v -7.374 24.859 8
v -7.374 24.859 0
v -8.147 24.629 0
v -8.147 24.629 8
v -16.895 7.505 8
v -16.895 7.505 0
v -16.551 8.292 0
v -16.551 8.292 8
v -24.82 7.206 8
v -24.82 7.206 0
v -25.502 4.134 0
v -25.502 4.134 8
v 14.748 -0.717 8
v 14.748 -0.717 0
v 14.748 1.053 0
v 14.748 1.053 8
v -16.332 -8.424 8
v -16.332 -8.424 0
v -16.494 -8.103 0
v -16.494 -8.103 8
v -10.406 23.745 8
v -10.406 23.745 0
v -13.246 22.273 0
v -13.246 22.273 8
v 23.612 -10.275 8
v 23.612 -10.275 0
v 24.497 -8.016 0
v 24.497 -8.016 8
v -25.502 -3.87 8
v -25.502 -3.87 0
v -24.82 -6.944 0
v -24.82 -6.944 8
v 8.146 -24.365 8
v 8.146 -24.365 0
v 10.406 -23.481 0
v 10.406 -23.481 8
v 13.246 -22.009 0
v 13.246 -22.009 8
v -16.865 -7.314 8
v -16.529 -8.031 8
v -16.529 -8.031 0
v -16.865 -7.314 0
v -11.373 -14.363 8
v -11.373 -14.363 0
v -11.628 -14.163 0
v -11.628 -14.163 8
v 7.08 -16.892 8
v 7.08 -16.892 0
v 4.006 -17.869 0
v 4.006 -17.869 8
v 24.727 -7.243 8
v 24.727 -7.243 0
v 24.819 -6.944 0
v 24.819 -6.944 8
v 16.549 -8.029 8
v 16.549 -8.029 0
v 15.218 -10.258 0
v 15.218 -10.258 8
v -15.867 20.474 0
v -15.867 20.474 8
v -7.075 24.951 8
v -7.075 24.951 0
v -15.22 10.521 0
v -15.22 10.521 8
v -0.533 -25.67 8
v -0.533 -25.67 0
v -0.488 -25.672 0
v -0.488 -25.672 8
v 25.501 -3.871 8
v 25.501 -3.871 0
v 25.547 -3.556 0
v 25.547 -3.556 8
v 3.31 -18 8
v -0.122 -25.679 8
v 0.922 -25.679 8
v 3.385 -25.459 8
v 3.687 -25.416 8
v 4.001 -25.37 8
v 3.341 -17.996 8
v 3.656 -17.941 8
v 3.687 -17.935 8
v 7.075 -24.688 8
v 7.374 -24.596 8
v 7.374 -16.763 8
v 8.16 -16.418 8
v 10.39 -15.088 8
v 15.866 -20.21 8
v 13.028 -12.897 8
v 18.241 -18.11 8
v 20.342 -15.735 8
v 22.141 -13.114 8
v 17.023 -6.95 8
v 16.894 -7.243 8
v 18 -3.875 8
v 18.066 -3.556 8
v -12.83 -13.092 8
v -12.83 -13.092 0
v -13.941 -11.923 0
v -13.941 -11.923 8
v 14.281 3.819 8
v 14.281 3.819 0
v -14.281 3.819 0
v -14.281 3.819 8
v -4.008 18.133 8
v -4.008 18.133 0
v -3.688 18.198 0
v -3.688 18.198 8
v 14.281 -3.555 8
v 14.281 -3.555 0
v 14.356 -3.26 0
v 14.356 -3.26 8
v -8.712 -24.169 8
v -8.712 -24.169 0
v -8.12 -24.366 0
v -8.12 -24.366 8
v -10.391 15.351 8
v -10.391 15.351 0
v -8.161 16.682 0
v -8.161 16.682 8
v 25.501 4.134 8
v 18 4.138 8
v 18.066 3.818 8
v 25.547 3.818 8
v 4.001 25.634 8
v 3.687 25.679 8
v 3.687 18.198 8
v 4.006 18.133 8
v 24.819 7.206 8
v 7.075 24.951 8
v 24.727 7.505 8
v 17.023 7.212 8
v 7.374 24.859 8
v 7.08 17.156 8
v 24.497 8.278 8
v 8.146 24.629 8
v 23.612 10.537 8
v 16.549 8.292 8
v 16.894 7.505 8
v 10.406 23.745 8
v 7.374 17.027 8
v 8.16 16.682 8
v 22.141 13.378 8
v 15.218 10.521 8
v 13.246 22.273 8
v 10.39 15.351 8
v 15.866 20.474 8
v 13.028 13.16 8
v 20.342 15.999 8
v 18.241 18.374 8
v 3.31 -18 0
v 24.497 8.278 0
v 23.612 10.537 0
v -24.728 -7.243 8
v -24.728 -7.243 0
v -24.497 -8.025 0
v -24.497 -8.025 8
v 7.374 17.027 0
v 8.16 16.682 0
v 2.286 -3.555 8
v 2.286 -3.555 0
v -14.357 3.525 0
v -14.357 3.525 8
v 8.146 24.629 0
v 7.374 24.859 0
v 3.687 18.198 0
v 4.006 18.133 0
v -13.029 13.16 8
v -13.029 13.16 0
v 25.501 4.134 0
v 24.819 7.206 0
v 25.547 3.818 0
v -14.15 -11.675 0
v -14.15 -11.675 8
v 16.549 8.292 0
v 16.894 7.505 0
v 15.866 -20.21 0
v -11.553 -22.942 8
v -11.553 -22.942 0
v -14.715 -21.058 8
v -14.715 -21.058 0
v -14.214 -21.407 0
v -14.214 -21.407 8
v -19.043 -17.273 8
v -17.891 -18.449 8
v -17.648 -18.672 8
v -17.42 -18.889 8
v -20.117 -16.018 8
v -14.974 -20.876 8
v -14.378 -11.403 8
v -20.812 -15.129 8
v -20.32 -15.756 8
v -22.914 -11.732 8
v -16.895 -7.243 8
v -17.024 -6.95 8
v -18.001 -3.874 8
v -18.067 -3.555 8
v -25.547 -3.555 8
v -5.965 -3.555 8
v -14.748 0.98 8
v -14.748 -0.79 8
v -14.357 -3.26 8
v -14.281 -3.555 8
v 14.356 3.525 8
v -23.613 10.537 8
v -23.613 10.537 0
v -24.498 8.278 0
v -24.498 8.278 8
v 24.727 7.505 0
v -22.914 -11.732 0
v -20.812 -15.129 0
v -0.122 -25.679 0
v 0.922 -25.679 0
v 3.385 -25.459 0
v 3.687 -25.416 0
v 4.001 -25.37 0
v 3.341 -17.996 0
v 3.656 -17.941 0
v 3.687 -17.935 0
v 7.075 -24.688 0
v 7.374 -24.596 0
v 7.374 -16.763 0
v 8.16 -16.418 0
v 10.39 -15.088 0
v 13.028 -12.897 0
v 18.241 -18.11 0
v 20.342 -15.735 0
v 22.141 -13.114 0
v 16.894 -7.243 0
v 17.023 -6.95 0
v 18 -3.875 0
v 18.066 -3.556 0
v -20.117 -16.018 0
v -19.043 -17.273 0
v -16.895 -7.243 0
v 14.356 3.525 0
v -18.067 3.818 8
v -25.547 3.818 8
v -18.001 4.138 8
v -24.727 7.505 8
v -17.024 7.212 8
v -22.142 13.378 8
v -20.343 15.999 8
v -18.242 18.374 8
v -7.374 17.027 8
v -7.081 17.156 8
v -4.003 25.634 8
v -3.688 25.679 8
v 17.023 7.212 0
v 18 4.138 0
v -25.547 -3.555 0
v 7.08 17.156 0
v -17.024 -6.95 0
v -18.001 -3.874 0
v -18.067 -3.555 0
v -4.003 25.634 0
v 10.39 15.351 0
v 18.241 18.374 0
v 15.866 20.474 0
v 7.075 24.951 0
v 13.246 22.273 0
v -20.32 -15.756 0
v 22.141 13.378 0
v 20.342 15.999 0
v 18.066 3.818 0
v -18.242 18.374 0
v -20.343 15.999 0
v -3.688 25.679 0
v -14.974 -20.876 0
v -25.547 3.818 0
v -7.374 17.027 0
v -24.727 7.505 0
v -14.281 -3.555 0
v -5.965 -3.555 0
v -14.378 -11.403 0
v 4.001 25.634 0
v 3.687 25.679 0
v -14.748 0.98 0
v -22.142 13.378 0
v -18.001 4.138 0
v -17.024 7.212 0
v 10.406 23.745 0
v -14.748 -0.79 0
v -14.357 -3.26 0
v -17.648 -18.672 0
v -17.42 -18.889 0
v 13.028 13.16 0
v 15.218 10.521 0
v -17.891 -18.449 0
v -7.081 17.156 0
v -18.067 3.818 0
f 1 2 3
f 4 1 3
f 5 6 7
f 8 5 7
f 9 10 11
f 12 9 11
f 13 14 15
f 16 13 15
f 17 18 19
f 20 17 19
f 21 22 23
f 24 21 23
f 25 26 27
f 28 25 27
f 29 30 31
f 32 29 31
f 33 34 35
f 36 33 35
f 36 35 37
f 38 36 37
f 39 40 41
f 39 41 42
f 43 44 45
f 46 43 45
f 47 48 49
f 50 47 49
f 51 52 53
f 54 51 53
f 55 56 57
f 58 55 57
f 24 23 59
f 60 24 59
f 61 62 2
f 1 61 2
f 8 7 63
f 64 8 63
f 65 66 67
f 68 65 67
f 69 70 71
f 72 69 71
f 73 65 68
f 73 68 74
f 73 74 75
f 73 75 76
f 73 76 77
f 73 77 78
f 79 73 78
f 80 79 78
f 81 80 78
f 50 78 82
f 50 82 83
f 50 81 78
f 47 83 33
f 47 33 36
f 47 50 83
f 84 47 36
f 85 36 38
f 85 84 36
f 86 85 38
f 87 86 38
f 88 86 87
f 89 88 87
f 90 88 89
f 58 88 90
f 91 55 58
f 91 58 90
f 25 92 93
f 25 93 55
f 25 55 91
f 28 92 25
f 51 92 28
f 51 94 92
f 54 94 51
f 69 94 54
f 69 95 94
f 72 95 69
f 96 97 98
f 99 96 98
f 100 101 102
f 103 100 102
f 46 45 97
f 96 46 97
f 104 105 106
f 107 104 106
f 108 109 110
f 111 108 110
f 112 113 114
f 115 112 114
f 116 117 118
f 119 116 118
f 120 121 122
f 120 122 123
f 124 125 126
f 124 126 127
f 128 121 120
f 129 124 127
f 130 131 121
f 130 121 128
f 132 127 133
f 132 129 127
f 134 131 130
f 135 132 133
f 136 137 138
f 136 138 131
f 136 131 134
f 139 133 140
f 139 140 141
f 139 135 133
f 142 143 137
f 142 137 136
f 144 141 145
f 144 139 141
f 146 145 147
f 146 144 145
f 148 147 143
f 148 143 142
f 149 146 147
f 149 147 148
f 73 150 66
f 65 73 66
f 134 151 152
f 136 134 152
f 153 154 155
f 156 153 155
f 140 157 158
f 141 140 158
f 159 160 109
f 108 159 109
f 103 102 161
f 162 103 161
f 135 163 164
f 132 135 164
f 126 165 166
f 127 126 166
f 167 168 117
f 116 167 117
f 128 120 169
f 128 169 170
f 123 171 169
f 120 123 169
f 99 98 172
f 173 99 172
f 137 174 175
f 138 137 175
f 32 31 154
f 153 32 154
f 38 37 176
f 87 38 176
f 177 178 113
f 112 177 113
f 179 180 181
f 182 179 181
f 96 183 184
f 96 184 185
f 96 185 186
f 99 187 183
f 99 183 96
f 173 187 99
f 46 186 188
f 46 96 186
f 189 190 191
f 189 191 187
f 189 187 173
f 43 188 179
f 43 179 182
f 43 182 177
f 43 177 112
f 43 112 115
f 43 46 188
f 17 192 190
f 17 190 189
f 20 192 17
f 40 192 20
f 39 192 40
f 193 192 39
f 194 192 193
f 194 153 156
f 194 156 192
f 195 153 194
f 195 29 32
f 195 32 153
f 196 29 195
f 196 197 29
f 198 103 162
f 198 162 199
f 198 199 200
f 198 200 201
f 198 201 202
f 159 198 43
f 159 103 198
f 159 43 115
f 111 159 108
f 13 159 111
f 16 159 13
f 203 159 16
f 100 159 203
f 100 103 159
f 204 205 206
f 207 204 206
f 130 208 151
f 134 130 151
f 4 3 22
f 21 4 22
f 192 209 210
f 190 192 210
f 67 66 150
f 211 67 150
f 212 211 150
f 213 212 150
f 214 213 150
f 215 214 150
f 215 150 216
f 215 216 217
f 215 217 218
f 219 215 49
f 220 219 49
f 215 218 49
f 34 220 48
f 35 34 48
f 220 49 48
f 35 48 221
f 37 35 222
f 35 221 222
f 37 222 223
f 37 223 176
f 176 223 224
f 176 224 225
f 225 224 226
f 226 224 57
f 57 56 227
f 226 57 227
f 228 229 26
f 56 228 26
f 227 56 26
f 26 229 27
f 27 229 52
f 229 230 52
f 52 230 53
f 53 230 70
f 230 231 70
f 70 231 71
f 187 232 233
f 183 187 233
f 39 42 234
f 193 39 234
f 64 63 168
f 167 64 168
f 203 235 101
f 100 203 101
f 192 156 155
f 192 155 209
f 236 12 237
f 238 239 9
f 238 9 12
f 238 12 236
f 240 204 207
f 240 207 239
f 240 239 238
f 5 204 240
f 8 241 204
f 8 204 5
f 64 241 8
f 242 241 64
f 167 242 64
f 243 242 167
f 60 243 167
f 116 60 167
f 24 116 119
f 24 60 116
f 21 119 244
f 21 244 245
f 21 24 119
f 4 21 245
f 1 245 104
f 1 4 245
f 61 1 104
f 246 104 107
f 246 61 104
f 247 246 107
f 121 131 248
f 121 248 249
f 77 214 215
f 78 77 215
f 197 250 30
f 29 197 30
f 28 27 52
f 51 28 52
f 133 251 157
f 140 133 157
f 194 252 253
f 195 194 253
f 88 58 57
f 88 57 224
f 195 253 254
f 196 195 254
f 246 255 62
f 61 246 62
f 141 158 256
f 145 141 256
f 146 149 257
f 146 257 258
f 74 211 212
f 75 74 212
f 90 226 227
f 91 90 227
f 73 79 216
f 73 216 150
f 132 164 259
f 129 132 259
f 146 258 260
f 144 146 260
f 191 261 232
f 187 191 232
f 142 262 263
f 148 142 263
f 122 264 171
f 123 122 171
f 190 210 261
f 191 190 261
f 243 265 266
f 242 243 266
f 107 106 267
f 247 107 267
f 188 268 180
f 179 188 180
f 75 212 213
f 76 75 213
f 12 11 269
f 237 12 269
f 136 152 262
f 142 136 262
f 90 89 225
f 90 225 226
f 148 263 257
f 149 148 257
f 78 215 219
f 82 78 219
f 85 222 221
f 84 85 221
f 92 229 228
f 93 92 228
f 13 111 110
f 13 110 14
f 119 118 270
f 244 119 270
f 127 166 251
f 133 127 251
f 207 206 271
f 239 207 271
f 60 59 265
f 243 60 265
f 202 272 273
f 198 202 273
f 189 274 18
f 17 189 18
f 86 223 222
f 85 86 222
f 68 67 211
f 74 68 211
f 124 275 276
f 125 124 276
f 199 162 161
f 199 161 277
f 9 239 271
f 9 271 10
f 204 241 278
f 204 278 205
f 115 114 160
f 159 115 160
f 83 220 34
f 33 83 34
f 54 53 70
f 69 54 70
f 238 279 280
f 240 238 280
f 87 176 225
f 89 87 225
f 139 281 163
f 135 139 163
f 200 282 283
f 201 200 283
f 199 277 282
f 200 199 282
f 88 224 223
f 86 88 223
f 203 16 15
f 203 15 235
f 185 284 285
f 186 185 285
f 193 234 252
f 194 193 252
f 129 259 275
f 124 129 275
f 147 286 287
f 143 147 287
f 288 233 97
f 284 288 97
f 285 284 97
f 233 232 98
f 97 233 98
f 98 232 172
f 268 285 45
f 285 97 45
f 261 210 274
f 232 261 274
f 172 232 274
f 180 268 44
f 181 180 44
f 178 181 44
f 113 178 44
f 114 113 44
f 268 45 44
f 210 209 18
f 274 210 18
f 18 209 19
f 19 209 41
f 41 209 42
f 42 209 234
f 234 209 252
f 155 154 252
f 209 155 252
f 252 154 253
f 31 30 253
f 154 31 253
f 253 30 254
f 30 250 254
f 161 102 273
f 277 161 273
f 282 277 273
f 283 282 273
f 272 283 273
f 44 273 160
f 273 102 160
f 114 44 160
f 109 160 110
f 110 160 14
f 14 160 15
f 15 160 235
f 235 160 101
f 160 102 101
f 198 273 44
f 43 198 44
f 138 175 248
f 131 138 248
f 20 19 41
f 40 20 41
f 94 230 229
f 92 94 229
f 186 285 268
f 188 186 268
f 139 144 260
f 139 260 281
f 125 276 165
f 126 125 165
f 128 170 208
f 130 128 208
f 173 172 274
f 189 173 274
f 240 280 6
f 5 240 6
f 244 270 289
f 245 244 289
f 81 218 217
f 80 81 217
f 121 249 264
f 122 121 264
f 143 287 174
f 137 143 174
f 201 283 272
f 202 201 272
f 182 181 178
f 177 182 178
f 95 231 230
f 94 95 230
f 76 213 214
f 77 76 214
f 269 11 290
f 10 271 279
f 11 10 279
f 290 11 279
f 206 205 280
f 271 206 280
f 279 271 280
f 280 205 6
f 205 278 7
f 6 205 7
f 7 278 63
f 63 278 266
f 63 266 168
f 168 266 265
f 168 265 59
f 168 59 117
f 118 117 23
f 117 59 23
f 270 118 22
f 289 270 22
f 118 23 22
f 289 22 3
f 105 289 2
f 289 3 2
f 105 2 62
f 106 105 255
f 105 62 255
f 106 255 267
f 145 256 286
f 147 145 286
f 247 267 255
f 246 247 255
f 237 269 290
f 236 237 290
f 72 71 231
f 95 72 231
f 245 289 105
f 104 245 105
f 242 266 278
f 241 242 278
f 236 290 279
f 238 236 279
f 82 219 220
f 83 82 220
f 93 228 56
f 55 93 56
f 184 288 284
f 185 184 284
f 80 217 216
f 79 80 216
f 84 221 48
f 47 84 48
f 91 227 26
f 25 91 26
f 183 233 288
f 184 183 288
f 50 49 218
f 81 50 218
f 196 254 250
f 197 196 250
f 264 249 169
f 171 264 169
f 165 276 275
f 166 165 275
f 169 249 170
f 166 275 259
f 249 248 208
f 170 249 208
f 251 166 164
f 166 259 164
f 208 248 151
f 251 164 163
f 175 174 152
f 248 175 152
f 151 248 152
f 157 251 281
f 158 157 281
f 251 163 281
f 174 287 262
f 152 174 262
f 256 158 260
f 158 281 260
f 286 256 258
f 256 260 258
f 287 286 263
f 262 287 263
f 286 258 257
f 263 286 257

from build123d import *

# Parameters (mm, degrees)
F1_DEPTH = 8


with BuildPart() as f1:
    # F0 (on Top) → F1 (new body)
    with BuildSketch(Plane.XY):
        Polygon((-17.024468, 7.21208), (-16.895009, 7.504593), (-16.55069, 8.291784), (-15.220021, 10.521496), (-13.02896, 13.159676), (-10.390892, 15.350737), (-8.161084, 16.682233), (-7.374052, 17.0266), (-7.08138, 17.156075), (-4.007533, 18.133026), (-3.687503, 18.1984), (-3.687503, 25.678704), (-4.003238, 25.633849), (-7.075336, 24.95116), (-7.374052, 24.858746), (-8.147246, 24.629222), (-10.406416, 23.744685), (-13.246428, 22.273374), (-15.867238, 20.47408), (-18.242093, 18.373525), (-20.342537, 15.99875), (-22.141799, 13.377907), (-23.613158, 10.537243), (-24.497694, 8.277787), (-24.727235, 7.504593), (-24.81957, 7.206195), (-25.502178, 4.133939), (-25.547049, 3.818203), (-18.06692, 3.818203), (-18.001323, 4.138233), align=None)
        Polygon((-8.119569, -24.366151), (2.285861, -3.554894), (14.281102, -3.554894), (14.356178, -3.259837), (14.747945, -0.716775), (14.747945, 0.1307), (14.747945, 1.053252), (14.356178, 3.524736), (14.281102, 3.818999), (-14.281117, 3.818999), (-14.357069, 3.524736), (-14.747976, 0.979766), (-14.747976, 0.1307), (-14.747976, -0.790102), (-14.357069, -3.259837), (-14.281117, -3.554894), (-5.964774, -3.554894), (-11.372932, -14.362716), (-11.627524, -14.163381), (-12.829625, -13.092441), (-13.941093, -11.923139), (-14.149956, -11.675465), (-14.377763, -11.402772), (-16.332379, -8.4239), (-16.493731, -8.102756), (-16.529122, -8.031179), (-16.864819, -7.314134), (-16.895009, -7.243352), (-17.024468, -6.949885), (-18.001323, -3.874288), (-18.06692, -3.554894), (-25.547049, -3.554894), (-25.502178, -3.869993), (-24.820444, -6.94384), (-24.72811, -7.243352), (-24.49682, -8.025135), (-22.91415, -11.732425), (-20.811989, -15.129038), (-20.320094, -15.756389), (-20.117307, -16.017869), (-19.042932, -17.272619), (-17.890872, -18.448825), (-17.648384, -18.672353), (-17.419686, -18.888945), (-14.974065, -20.876329), (-14.715178, -21.057547), (-14.213803, -21.407066), (-11.553291, -22.942272), (-8.711593, -24.169393), align=None)
        Polygon((16.548988, 8.291784), (16.89415, 7.504593), (17.022671, 7.21208), (18.000417, 4.138233), (18.066109, 3.818203), (25.547049, 3.818203), (25.50124, 4.133939), (24.818552, 7.206195), (24.727092, 7.504593), (24.496772, 8.277787), (23.612236, 10.537243), (22.140925, 13.377907), (20.34179, 15.99875), (18.241235, 18.373525), (15.8663, 20.47408), (13.245617, 22.273374), (10.405589, 23.744685), (8.14645, 24.629222), (7.374052, 24.858746), (7.074541, 24.95116), (4.001489, 25.633849), (3.686549, 25.678704), (3.686549, 18.1984), (4.005783, 18.133026), (7.080426, 17.156075), (7.374052, 17.0266), (8.16013, 16.682233), (10.390001, 15.350737), (13.028022, 13.159676), (15.218128, 10.521496), align=None)
        Polygon((17.022671, -6.949885), (16.89415, -7.243352), (16.548988, -8.029429), (15.218128, -10.258489), (13.028022, -12.896542), (10.390001, -15.087603), (8.16013, -16.418288), (7.374052, -16.763466), (7.080426, -16.892066), (4.005783, -17.868921), (3.686549, -17.934502), (3.655532, -17.940562), (3.340592, -17.995788), (3.31037, -18.000099), (-0.532535, -25.670083), (-0.487521, -25.671801), (-0.122477, -25.678704), (0, -25.678704), (0.921756, -25.678704), (3.385447, -25.458659), (3.686549, -25.415506), (4.001489, -25.36976), (7.074541, -24.688026), (7.374052, -24.595692), (8.14645, -24.365276), (10.405589, -23.480756), (13.245617, -22.009397), (15.8663, -20.210135), (18.241235, -18.109691), (20.34179, -15.734836), (22.140925, -13.114026), (23.612236, -10.274873), (24.496772, -8.015591), (24.727092, -7.243352), (24.818552, -6.94384), (25.50124, -3.870948), (25.547049, -3.555849), (18.066109, -3.555849), (18.000417, -3.875242), align=None)
    extrude(amount=F1_DEPTH)


solid = f1.part
